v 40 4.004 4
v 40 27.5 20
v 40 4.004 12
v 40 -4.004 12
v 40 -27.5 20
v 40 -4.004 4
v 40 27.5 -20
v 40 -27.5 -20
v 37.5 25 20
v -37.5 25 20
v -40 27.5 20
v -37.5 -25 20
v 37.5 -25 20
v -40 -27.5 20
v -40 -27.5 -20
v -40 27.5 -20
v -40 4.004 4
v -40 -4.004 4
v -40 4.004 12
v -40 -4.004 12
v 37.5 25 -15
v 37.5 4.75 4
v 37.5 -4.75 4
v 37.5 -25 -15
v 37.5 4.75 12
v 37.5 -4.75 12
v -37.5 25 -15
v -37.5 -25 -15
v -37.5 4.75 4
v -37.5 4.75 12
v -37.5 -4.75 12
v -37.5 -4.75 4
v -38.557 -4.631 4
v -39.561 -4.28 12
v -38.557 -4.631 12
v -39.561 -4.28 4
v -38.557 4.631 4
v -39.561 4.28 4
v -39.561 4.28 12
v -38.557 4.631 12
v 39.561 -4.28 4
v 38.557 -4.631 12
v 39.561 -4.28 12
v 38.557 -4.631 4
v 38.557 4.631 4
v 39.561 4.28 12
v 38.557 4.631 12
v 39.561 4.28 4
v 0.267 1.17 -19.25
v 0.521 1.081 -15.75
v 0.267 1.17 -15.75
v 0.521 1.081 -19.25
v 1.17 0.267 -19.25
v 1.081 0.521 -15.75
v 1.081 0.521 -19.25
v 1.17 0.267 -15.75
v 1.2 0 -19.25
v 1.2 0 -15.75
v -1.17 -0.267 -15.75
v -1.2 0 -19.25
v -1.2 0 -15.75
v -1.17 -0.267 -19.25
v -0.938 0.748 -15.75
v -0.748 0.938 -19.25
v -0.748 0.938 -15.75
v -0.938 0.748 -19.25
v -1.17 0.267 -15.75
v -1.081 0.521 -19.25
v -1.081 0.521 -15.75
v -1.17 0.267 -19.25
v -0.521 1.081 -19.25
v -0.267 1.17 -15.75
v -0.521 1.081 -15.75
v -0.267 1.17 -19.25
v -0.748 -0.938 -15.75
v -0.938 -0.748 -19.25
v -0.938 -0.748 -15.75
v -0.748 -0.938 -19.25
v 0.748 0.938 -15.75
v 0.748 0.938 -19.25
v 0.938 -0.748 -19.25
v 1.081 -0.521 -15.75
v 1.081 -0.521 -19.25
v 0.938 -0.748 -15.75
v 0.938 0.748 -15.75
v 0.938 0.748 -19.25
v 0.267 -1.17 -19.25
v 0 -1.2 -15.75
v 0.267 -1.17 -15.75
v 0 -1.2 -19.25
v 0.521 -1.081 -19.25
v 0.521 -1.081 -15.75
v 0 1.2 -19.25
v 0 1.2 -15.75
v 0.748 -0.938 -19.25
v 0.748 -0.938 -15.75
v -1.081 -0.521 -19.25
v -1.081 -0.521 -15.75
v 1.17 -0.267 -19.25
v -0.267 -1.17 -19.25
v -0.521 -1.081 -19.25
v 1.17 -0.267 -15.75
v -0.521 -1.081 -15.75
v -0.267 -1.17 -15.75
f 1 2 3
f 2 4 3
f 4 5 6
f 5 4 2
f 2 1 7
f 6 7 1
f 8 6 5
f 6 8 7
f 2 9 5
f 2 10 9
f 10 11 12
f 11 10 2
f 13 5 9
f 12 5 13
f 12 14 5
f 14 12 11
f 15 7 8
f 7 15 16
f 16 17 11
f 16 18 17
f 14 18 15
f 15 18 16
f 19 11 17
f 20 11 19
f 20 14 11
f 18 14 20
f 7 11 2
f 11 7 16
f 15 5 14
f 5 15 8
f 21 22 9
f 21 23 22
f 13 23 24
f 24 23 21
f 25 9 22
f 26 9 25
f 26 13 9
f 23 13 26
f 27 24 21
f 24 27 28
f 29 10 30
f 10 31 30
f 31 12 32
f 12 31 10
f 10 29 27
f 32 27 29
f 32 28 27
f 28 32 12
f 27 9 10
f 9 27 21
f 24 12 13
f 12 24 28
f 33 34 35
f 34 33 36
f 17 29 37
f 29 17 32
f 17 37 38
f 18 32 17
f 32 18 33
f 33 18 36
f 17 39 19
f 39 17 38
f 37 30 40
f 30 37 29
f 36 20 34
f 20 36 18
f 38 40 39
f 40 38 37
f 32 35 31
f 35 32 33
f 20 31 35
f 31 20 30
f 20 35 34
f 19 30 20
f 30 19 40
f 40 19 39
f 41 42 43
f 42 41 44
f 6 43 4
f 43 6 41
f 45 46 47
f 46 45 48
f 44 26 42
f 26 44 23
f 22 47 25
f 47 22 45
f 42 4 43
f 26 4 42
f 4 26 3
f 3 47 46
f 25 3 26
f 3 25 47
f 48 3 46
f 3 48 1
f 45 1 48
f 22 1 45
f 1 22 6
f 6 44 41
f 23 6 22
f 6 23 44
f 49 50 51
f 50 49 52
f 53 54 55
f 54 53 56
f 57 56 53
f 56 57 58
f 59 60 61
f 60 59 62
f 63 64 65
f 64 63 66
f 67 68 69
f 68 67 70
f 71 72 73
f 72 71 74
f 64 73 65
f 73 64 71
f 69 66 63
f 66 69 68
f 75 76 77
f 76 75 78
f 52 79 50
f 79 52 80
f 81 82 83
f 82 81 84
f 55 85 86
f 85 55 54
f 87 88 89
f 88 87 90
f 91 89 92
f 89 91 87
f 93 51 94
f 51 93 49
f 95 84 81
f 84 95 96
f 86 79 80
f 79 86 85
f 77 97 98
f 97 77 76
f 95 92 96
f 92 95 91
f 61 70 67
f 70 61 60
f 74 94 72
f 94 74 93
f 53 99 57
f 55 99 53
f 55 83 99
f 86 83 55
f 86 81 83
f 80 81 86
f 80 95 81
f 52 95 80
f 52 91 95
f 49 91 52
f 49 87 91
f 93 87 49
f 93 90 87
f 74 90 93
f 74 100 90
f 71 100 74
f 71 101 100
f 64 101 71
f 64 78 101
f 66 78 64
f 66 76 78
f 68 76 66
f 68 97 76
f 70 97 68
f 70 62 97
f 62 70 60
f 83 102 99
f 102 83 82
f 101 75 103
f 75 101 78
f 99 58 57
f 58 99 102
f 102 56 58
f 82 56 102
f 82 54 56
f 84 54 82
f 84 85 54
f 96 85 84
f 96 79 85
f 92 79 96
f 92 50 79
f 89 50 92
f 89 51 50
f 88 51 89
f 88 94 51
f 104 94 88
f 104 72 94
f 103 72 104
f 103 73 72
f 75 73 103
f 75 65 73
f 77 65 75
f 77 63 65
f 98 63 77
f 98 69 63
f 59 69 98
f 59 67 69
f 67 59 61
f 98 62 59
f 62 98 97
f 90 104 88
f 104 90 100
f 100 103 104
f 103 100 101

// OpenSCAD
// VHF/UHF COMPACT BALUN ENCLOSURE — FDM 3D-PRINTABLE
// Purpose: Small, lightweight enclosure for VHF/UHF air-core chokes
// Dimensions: 80×55×40 mm (ultra-compact, minimal weight)
// Features: BNC connectors (mini-sized), snap-fit lid
// Material: PETG recommended (UV-resistant)
// Print time: ~2–3 hours
// Filament: ~25–35 grams

$fn = 28;  // Smooth cylinder quality

// External dimensions
box_l = 80;
box_w = 55;
box_h = 40;
wall = 2.5;  // Thinner walls for VHF/UHF

// Internal cavity
cav_l = box_l - 2*wall;
cav_w = box_w - 2*wall;
cav_h = box_h - 2*wall;

// BNC connector hole diameter
bnc_hole = 9.5;  // For standard BNC plug

// Snap-fit lid clip height
clip_height = 3;

module base() {
    difference() {
        // Outer box
        cube([box_l, box_w, box_h], center=true);

        // Internal cavity
        translate([0, 0, wall])
            cube([cav_l, cav_w, cav_h], center=true);

        // BNC connector hole (front)
        translate([-box_l/2 + wall, 0, box_h/2 - 12])
            cylinder(h=8, r=bnc_hole/2, center=true);

        // BNC connector hole (rear)
        translate([box_l/2 - wall, 0, box_h/2 - 12])
            cylinder(h=8, r=bnc_hole/2, center=true);

        // Drain hole
        translate([0, 0, -box_h/2 + wall])
            cylinder(h=wall+1, r=1.2, center=true);
    }
}

module snap_fit_lid() {
    difference() {
        // Lid plate
        cube([box_l - 2*wall - 2, box_w - 2*wall - 2, 2.5], center=true);

        // Snap-fit notch (fits into base)
        translate([0, 0, -1])
            cube([box_l - 2*wall - 4, box_w - 2*wall - 4, 1.5], center=true);
    }

    // Snap-fit clips (4 corners)
    for(i=[-1, 1])
        for(j=[-1, 1])
            translate([i*(box_l/2 - 8), j*(box_w/2 - 8), 1])
                cube([3, 3, clip_height], center=true);
}

module retention_tabs() {
    // Optional: Retention slots on base for lid stability
    difference() {
        cube([1, 8, 5], center=true);
    }
}

base();

// Uncomment to show lid position:
// translate([0, 0, box_h/2 + 3])
//     snap_fit_lid();

// PRINTING & ASSEMBLY:
// 1. Print base (standard orientation)
// 2. Print snap-fit lid separately
// 3. Assembly:
//    - Insert BNC connectors
//    - Snap lid onto base (push down until clips engage)
//    - No screws required (fast assembly)
// 4. For potting:
//    - Snap lid off before potting
//    - Apply epoxy or silicone inside
//    - Re-snap lid after cure
